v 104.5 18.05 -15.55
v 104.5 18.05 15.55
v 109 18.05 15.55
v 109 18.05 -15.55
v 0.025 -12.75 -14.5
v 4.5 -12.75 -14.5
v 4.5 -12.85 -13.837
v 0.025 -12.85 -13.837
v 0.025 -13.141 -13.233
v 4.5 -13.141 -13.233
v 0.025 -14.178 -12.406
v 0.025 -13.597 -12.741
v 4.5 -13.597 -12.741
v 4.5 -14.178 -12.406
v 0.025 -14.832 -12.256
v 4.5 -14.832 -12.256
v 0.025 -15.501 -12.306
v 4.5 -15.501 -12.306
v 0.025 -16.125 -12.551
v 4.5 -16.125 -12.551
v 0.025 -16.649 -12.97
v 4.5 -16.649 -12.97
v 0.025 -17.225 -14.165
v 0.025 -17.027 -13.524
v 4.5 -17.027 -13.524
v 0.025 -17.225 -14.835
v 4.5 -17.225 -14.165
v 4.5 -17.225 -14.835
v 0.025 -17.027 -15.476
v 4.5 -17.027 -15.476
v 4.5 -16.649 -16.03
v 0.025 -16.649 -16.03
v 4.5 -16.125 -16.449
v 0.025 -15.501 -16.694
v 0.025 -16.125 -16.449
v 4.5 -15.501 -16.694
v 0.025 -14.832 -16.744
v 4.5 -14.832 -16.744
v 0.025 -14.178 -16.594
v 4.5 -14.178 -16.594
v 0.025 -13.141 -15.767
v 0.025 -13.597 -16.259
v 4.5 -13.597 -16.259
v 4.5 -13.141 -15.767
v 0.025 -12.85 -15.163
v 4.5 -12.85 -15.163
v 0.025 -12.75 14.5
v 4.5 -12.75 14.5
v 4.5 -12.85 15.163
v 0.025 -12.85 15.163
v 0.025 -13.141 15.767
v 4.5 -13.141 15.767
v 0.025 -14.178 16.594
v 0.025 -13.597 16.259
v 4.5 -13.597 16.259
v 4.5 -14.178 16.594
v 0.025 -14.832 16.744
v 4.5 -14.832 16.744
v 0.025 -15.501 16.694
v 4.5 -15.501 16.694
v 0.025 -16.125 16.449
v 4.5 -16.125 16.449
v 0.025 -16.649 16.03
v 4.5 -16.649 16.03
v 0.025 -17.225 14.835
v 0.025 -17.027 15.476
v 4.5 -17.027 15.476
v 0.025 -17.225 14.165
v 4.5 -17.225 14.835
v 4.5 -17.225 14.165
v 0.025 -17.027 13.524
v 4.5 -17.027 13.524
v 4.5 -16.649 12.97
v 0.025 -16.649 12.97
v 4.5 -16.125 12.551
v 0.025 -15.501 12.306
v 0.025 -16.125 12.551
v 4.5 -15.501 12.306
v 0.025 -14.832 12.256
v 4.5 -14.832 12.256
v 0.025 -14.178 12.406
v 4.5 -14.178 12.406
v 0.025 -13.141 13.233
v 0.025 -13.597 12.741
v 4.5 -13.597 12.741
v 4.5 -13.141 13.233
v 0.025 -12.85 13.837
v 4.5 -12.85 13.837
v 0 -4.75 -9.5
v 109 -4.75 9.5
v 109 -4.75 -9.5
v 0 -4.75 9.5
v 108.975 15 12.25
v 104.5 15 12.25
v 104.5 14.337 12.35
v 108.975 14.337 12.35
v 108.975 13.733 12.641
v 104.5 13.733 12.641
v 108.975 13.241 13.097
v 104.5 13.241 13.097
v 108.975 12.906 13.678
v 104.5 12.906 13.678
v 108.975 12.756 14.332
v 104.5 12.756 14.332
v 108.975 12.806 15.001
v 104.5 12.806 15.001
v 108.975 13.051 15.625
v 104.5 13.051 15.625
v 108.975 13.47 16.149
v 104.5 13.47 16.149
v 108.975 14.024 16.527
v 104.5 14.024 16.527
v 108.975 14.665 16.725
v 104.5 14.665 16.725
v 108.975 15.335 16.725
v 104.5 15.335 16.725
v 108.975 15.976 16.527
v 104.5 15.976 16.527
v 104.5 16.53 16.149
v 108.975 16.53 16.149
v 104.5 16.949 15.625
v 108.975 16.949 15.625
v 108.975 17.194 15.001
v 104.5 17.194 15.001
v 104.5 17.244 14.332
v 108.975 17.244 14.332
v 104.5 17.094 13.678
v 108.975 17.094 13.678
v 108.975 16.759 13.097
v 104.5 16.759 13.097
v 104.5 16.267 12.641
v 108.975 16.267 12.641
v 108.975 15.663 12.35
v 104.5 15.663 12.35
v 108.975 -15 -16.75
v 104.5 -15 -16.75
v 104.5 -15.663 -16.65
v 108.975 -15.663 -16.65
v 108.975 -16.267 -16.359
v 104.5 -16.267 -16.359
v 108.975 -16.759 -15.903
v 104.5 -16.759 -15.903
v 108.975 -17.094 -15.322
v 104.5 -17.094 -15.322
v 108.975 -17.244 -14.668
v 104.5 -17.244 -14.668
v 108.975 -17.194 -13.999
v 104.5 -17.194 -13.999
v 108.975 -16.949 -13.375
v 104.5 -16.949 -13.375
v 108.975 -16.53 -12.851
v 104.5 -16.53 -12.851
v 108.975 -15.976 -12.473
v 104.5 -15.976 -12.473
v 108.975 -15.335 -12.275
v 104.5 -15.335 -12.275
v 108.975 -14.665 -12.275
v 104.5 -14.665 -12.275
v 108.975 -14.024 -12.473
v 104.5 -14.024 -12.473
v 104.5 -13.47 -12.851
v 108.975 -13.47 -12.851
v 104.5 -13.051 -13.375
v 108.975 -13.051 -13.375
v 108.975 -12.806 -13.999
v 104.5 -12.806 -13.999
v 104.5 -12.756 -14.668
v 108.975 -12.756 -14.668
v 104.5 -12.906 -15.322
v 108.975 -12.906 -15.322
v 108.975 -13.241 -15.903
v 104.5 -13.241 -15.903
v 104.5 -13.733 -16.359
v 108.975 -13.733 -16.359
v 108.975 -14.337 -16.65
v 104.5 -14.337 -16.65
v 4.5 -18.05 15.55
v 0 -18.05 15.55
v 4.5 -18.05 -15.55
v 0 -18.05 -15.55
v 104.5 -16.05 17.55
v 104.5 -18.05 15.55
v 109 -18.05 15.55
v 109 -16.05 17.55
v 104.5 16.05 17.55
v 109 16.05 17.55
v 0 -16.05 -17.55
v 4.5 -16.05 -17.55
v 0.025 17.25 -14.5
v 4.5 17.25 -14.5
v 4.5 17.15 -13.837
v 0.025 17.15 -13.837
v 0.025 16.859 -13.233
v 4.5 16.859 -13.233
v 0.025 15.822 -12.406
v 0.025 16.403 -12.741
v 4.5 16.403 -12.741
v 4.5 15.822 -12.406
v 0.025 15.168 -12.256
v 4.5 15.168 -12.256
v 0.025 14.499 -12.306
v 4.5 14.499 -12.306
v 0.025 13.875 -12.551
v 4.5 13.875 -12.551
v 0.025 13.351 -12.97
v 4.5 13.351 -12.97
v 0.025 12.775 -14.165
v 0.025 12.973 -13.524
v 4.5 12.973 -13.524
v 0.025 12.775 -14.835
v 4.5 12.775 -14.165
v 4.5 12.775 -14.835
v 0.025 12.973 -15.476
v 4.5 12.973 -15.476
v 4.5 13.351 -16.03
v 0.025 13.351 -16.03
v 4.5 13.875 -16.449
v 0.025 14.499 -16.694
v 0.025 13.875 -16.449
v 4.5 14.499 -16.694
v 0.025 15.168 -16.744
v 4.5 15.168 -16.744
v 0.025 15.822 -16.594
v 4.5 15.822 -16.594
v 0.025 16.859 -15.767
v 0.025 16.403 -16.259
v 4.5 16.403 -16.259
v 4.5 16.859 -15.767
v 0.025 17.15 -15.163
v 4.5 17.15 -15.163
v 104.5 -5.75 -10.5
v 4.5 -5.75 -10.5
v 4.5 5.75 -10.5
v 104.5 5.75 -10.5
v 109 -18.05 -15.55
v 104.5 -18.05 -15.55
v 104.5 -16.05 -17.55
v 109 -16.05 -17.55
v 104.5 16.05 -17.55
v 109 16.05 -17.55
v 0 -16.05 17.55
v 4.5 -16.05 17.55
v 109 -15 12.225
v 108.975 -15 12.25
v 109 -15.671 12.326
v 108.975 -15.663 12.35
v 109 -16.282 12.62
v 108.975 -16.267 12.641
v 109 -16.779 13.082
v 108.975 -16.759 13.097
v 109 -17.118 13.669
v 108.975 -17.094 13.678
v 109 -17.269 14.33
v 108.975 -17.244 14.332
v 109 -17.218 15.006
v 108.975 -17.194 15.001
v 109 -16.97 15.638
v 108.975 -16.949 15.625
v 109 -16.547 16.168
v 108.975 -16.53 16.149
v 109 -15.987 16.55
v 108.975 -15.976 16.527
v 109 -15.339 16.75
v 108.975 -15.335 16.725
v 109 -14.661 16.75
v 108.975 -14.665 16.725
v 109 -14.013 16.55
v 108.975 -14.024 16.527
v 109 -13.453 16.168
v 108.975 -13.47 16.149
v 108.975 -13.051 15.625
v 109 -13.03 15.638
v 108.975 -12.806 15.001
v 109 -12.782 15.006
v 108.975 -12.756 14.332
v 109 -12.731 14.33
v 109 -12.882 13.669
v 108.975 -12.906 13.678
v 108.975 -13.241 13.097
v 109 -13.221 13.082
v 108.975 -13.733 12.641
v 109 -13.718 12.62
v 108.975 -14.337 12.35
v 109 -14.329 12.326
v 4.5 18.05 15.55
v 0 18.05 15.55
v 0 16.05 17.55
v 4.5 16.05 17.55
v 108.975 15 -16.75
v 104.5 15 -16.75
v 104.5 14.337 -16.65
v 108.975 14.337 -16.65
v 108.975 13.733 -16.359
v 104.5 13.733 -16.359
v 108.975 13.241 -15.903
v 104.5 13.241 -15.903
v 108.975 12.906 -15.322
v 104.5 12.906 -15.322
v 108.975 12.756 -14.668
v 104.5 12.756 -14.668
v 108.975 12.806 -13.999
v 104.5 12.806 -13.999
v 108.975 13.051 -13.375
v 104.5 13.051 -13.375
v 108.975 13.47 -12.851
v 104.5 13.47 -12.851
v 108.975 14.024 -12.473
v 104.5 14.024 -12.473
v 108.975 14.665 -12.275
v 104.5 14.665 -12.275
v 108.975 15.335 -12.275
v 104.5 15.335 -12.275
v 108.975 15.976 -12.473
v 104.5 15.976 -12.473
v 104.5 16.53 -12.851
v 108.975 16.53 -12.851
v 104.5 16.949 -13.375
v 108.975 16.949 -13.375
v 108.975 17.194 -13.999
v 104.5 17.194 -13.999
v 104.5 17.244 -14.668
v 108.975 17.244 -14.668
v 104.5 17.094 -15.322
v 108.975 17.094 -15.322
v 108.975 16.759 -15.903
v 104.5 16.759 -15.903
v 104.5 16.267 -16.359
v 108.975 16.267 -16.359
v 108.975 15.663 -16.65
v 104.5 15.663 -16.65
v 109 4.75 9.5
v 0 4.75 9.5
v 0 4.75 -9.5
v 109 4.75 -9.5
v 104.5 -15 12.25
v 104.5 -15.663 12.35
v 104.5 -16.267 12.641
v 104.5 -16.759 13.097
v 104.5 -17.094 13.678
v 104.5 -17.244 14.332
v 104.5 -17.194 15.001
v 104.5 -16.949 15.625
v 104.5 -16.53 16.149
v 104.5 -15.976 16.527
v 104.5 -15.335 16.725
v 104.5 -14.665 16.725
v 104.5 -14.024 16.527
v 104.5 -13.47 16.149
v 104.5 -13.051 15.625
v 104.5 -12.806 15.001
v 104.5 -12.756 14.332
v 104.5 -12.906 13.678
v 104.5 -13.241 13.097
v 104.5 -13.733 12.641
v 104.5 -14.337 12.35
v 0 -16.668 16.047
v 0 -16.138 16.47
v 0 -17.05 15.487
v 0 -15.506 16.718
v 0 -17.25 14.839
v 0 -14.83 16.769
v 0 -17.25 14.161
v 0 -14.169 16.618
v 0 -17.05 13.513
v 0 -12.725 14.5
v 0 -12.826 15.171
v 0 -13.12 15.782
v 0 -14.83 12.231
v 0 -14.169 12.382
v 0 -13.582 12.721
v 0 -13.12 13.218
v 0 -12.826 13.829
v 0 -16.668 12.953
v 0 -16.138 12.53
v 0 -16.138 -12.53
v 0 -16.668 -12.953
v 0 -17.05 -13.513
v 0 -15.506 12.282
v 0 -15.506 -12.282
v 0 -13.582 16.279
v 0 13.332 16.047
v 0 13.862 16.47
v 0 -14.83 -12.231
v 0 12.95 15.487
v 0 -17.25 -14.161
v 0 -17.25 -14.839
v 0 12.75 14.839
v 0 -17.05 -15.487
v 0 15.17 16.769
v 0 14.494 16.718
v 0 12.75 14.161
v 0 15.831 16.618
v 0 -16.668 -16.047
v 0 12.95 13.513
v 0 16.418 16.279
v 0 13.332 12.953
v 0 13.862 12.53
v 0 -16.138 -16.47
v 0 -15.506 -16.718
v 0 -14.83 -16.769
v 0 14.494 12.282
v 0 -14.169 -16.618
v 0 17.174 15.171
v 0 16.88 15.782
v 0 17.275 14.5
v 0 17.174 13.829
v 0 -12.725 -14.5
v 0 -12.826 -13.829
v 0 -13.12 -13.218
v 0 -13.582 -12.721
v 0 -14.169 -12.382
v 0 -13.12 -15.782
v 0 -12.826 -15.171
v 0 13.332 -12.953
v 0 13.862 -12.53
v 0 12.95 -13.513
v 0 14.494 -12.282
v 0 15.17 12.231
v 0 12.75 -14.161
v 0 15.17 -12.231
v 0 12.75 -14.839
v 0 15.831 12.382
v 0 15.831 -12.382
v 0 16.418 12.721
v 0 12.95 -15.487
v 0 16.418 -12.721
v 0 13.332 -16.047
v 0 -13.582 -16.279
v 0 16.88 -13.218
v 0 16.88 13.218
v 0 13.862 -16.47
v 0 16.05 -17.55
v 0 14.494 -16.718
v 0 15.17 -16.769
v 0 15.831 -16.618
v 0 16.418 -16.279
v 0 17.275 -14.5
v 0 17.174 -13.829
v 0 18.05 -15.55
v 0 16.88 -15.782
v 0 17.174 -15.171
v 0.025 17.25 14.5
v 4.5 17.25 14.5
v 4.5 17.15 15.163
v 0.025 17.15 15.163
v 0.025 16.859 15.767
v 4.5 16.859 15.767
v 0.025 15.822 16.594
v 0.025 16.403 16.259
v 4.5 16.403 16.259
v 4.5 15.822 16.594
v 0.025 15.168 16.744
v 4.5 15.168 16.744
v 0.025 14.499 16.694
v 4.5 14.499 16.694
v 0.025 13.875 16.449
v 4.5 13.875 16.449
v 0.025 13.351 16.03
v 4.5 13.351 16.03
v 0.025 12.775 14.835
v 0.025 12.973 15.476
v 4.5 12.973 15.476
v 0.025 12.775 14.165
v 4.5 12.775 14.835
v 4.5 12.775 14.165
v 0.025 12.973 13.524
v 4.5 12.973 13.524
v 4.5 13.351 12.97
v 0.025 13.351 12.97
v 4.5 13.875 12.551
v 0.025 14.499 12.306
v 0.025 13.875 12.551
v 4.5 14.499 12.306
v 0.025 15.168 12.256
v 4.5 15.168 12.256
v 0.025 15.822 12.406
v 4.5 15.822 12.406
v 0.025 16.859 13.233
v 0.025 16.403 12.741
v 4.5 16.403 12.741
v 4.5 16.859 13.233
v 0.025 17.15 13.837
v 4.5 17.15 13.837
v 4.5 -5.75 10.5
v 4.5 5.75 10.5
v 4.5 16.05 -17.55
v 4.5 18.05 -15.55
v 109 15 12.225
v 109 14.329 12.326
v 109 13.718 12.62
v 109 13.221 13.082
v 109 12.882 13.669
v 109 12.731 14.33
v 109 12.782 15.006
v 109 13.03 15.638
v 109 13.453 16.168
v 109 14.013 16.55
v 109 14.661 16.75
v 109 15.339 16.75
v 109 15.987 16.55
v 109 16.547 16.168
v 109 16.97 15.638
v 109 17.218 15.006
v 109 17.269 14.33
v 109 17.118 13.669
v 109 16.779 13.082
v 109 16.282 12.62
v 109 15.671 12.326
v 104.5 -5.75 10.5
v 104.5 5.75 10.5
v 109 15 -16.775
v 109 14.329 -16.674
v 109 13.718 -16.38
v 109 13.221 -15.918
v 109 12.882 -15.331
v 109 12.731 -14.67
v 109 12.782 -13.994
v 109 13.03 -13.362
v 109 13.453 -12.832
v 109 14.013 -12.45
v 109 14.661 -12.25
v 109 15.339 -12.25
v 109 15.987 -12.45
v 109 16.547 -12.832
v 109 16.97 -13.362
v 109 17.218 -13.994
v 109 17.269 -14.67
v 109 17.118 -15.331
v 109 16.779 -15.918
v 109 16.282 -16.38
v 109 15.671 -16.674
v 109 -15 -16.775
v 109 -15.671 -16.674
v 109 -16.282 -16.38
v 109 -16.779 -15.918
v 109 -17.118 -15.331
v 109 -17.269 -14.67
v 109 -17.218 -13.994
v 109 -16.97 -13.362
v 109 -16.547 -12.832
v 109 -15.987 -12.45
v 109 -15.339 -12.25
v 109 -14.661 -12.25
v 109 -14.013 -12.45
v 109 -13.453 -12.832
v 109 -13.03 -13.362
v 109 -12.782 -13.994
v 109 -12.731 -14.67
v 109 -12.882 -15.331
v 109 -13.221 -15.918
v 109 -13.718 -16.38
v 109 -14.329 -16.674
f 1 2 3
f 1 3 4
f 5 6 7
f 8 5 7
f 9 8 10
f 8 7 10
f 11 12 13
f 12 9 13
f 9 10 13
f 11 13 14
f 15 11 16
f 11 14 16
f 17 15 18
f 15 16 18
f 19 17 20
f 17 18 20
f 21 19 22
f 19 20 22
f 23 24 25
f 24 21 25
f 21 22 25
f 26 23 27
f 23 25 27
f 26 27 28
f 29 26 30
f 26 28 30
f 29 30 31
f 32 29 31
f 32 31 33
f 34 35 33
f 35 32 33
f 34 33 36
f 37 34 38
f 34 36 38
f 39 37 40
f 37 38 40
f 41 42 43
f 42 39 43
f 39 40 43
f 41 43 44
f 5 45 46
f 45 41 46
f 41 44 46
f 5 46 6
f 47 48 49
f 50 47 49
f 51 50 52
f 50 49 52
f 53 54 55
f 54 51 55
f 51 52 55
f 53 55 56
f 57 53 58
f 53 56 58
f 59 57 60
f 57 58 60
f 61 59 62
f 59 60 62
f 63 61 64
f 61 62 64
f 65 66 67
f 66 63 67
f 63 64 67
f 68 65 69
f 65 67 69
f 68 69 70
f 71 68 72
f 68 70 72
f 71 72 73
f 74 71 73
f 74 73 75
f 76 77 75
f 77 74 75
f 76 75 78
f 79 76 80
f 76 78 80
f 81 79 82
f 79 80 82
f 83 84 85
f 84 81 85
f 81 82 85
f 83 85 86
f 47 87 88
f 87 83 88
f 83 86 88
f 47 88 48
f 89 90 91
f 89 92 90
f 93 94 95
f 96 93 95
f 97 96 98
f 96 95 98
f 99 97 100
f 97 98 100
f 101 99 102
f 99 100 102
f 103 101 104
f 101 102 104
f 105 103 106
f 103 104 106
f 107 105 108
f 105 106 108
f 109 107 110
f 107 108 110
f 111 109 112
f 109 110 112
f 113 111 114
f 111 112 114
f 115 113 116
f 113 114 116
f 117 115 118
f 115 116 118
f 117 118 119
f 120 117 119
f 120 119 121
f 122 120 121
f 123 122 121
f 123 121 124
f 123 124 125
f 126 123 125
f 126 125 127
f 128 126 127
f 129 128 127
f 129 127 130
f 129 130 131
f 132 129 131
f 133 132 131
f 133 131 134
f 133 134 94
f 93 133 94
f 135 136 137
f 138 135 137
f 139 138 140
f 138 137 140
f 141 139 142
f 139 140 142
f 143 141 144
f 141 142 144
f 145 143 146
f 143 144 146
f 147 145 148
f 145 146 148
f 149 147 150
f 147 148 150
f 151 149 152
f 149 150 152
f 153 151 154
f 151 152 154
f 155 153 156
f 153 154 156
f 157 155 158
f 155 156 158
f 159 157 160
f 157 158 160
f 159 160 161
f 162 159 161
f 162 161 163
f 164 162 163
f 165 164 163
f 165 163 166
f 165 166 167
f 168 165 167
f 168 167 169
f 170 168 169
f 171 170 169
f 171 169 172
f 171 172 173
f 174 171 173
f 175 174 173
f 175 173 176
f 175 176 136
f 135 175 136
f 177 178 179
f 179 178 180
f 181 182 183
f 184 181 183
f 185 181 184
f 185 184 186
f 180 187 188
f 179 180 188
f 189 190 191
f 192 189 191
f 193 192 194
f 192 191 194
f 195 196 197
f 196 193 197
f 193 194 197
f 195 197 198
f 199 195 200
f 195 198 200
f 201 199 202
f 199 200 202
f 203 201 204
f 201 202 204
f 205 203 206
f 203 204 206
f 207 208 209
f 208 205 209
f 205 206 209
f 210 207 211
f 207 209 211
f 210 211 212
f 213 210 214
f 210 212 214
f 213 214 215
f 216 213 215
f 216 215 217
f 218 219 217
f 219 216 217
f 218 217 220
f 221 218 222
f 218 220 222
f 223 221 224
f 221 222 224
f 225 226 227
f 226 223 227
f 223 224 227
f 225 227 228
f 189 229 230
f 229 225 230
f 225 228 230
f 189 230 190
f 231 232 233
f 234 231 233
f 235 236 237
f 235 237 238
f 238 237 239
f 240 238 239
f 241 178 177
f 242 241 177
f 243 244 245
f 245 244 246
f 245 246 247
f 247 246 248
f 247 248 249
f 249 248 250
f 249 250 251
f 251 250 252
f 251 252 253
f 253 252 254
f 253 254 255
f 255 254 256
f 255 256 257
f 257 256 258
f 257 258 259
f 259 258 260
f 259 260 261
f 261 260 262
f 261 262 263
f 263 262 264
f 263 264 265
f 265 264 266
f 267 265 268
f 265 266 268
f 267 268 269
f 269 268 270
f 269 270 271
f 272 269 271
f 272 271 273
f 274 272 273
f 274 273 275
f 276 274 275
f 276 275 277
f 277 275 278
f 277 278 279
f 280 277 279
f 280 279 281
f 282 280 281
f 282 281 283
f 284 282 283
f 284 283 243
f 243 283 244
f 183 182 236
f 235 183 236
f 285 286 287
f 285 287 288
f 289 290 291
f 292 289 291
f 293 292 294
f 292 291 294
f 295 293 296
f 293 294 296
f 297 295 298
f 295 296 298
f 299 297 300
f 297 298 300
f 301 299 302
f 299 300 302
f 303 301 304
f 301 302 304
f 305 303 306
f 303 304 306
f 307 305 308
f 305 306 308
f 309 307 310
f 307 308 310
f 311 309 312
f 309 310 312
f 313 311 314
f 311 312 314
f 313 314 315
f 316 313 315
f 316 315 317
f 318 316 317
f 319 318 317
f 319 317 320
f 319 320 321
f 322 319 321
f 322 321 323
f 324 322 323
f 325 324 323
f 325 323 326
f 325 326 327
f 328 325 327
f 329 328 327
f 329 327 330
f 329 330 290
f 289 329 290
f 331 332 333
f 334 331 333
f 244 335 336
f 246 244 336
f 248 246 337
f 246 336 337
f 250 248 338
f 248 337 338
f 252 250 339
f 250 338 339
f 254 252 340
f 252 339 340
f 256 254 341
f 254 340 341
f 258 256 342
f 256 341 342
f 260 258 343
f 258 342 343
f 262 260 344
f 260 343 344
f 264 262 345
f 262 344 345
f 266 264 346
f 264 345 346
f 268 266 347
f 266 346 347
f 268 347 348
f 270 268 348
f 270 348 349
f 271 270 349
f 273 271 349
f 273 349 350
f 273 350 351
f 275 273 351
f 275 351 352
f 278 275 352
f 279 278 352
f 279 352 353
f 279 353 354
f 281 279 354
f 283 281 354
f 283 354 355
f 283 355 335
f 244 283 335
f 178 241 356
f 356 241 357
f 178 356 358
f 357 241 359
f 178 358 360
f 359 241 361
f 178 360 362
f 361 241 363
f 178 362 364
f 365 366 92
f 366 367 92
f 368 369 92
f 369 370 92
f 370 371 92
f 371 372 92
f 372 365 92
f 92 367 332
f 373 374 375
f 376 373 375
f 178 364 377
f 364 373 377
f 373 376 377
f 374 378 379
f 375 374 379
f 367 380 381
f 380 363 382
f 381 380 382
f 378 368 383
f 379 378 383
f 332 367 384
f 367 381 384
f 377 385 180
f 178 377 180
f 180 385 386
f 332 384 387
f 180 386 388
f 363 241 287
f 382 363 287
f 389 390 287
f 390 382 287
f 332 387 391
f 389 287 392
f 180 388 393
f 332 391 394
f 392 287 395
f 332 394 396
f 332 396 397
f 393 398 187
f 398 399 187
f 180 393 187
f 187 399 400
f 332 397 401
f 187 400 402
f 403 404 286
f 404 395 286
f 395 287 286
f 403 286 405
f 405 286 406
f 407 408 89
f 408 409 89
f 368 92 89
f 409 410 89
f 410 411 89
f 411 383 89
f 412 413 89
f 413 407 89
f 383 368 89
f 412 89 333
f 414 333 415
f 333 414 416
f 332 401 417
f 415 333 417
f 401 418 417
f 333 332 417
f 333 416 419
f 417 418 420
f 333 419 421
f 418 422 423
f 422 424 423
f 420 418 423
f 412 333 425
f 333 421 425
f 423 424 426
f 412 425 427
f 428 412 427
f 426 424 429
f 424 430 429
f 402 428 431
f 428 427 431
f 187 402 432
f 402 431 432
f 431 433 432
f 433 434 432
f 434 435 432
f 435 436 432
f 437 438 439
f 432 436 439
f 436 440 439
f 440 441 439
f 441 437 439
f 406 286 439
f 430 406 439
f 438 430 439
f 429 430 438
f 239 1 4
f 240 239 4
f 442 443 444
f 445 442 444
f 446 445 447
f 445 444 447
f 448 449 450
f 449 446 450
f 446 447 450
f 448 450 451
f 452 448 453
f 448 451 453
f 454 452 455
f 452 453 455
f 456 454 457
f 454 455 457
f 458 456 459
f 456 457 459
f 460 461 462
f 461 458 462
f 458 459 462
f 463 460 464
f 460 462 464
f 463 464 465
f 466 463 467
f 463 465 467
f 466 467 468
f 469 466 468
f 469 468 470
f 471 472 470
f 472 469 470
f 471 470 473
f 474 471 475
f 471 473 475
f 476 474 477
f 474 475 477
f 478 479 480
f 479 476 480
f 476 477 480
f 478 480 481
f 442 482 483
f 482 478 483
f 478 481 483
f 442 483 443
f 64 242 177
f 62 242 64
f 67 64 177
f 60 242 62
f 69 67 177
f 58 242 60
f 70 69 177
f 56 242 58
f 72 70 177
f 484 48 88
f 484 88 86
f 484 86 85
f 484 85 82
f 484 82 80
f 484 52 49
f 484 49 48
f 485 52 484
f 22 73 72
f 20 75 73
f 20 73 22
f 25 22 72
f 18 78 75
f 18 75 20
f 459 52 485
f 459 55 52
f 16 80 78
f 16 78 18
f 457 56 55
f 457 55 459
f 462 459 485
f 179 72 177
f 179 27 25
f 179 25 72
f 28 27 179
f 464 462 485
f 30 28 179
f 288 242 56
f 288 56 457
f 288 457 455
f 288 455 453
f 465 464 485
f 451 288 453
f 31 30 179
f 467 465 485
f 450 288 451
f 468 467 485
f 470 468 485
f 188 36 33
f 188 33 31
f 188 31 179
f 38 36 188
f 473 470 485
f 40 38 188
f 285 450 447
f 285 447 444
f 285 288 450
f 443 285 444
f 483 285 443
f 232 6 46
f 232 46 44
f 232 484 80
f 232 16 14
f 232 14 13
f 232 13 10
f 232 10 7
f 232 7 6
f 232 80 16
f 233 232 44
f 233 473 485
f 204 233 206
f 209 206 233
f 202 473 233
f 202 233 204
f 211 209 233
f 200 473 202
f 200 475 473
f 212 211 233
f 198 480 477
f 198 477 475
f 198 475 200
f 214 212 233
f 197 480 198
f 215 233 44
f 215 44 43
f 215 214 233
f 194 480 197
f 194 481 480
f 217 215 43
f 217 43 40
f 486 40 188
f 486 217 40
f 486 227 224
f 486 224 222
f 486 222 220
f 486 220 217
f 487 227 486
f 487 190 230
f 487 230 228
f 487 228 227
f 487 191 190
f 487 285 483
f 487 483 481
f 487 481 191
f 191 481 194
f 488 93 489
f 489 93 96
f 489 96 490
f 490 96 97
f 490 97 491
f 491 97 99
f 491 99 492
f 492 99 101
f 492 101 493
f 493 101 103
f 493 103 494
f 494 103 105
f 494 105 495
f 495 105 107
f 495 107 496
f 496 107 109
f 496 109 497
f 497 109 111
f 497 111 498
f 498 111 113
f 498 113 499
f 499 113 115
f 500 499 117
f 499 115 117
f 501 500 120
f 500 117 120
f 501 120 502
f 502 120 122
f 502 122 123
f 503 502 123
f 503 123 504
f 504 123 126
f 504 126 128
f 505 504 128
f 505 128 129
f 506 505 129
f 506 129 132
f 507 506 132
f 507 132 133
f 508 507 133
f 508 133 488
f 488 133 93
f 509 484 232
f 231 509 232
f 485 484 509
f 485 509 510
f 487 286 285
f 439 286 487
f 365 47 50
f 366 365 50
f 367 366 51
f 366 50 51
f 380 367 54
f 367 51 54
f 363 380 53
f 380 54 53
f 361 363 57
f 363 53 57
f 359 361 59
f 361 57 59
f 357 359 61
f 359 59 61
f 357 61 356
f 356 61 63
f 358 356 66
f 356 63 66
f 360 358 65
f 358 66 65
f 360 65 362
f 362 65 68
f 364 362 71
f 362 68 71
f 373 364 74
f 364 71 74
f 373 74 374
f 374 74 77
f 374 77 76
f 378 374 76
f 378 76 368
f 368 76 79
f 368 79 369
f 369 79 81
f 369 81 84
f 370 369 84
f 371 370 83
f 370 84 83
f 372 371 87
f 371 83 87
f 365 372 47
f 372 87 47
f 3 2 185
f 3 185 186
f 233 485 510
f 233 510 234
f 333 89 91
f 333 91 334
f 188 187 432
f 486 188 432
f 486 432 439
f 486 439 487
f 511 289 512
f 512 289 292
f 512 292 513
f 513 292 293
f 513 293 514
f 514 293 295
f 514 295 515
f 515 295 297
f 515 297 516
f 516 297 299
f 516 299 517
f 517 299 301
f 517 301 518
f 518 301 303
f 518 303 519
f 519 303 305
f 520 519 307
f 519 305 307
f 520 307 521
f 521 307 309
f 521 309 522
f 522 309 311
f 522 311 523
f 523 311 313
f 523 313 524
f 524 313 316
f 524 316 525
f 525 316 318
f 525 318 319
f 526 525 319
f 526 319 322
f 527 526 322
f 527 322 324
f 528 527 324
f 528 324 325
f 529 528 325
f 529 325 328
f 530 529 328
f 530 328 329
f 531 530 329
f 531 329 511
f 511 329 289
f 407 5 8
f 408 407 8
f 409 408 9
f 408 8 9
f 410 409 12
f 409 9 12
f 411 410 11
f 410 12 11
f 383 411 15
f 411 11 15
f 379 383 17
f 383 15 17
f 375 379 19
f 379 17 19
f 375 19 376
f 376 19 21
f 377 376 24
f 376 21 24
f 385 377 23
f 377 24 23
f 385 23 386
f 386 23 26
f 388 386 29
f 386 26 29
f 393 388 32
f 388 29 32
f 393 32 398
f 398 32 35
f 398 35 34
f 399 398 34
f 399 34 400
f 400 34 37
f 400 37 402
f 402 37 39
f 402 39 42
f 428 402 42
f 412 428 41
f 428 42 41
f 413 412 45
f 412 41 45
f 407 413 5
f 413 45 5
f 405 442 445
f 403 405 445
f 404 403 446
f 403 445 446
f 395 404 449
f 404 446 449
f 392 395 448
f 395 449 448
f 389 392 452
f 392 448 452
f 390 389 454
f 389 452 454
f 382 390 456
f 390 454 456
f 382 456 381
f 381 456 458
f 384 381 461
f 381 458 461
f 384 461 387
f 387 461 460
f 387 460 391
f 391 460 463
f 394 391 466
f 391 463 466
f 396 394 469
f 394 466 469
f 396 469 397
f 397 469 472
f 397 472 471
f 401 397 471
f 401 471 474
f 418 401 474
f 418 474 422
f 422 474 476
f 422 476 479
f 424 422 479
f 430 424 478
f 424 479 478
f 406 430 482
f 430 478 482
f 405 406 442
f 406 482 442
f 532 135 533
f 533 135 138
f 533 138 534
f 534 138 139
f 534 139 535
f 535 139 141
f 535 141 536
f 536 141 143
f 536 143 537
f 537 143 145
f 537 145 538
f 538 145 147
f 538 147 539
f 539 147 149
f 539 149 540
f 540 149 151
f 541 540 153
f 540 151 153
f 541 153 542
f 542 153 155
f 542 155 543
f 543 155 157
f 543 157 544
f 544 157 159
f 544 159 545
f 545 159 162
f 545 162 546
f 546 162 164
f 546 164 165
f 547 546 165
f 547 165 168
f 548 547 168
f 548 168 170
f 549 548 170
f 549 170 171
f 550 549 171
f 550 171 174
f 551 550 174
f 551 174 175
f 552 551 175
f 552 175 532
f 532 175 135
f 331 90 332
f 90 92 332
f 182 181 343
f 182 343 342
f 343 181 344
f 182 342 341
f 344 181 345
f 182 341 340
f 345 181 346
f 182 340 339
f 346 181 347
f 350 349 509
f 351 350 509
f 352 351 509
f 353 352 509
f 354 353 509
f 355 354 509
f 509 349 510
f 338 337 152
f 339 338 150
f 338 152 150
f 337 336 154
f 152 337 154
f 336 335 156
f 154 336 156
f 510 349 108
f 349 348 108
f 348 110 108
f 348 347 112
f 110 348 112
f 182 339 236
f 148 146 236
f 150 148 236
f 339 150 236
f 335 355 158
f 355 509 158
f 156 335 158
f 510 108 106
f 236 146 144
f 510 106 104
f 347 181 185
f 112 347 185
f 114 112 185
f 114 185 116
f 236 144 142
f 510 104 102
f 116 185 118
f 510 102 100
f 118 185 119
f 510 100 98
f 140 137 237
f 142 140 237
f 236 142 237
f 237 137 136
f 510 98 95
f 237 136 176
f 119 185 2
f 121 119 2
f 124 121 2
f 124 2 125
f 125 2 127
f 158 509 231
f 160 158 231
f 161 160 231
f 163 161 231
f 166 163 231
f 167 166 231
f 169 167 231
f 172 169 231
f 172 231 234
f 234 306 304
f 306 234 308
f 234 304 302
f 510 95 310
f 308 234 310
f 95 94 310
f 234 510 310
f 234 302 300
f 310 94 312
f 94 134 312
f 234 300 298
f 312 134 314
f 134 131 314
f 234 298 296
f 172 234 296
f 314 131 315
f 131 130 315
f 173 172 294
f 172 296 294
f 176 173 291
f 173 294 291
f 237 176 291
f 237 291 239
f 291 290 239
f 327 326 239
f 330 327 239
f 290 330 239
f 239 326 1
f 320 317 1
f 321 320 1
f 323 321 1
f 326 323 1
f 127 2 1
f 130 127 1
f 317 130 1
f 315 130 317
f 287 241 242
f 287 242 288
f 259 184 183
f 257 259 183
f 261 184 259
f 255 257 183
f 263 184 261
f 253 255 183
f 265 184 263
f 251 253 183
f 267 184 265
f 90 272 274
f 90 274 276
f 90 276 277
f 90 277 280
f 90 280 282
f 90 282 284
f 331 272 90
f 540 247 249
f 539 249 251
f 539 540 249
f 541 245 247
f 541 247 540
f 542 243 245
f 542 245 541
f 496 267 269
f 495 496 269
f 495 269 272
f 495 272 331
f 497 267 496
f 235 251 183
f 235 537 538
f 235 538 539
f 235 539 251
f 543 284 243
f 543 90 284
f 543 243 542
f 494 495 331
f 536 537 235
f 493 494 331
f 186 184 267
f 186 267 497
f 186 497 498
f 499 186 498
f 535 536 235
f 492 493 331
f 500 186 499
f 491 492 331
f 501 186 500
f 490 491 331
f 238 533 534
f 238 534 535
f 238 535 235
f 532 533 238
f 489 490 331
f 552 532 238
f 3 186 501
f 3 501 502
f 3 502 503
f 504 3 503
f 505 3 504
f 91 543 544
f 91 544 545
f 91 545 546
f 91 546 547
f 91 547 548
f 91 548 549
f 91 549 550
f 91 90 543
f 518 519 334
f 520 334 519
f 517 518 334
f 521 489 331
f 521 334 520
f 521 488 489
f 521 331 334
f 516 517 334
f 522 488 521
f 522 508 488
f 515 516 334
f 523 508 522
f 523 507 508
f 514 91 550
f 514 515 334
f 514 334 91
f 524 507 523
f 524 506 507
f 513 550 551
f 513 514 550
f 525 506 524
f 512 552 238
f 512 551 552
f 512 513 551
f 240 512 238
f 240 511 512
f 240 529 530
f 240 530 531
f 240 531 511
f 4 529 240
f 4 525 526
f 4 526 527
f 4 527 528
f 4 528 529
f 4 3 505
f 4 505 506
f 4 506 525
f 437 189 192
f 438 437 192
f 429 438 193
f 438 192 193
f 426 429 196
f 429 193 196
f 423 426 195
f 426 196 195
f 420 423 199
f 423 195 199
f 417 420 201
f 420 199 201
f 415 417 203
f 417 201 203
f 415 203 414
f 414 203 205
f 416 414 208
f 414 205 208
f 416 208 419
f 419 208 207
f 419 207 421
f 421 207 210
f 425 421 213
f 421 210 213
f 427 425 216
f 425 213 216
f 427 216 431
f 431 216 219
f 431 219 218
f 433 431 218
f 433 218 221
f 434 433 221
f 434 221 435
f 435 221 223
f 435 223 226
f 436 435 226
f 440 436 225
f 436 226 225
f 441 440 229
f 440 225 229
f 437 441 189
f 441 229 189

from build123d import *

# Parameters (mm, degrees)
SKETCH_1_W                  = 35.1
SKETCH_1_H                  = 36.1
SKETCH_1_W_2                = 19
SKETCH_1_H_2                = 9.5
EXTRUDE_1_DEPTH             = 4.5
CHAMFER_1_SIZE              = 2
SKETCH_4_W                  = 21
SKETCH_4_H                  = 11.5
SKETCH_4_W_2                = 19
SKETCH_4_H_2                = 9.5
EXTRUDE_2_DEPTH             = 100
SKETCH_5_W                  = 35.1
SKETCH_5_H                  = 36.1
SKETCH_5_W_2                = 19
SKETCH_5_H_2                = 9.5
EXTRUDE_3_DEPTH             = 4.5
CHAMFER_2_SIZE              = 2
PATTERN_LINEAR_1_COUNT      = 2
PATTERN_LINEAR_1_PITCH      = 29
PATTERN_LINEAR_1_COUNT_DIR2 = 2
PATTERN_LINEAR_1_PITCH_DIR2 = 30
HOLE_WIZARD_M42_D           = 4.5
HOLE_WIZARD_M42_CSINK_D     = 4.55
HOLE_WIZARD_M42_CSINK_ANGLE = 90


# Read off the part's stored shape, not the designer's step: Отверстие с зазором M41
with BuildPart() as part:
    # Эскиз1 → Бобышка-Вытянуть1 (new body)
    with BuildSketch(Plane(origin=(0, 0, 0), x_dir=(0, 0, -1), z_dir=(1, 0, 0))):
        Rectangle(SKETCH_1_W, SKETCH_1_H)
        Rectangle(SKETCH_1_W_2, SKETCH_1_H_2, mode=Mode.SUBTRACT)
    extrude(amount=EXTRUDE_1_DEPTH)

    # Фаска1
    chamfer_1_edges = [part.edges().sort_by_distance(p)[0] for p in [
        (2.25, -18.05, -17.55),
        (2.25, -18.05, 17.55),
        (2.25, 18.05, 17.55),
        (2.25, 18.05, -17.55),
    ]]
    chamfer(chamfer_1_edges, length=CHAMFER_1_SIZE)

    # Эскиз4 → Бобышка-Вытянуть2 (add)
    with BuildSketch(Plane(origin=(4.5, 0, 0), x_dir=(0, 0, -1), z_dir=(1, 0, 0))):
        Rectangle(SKETCH_4_W, SKETCH_4_H)
        Rectangle(SKETCH_4_W_2, SKETCH_4_H_2, mode=Mode.SUBTRACT)
    extrude(amount=EXTRUDE_2_DEPTH)

    # Эскиз5 → Бобышка-Вытянуть3 (add)
    with BuildSketch(Plane(origin=(104.5, 0, 0), x_dir=(0, 0, -1), z_dir=(1, 0, 0))):
        Rectangle(SKETCH_5_W, SKETCH_5_H)
        Rectangle(SKETCH_5_W_2, SKETCH_5_H_2, mode=Mode.SUBTRACT)
    extrude(amount=EXTRUDE_3_DEPTH)

    # Фаска2
    chamfer_2_edges = [part.edges().sort_by_distance(p)[0] for p in [
        (106.75, -18.05, -17.55),
        (106.75, 18.05, -17.55),
        (106.75, 18.05, 17.55),
        (106.75, -18.05, 17.55),
    ]]
    chamfer(chamfer_2_edges, length=CHAMFER_2_SIZE)

    # Отверстие с зазором M41 outline → Отверстие с зазором M41 (revolve, cut)
    with BuildSketch(Plane(origin=(0, 15, 14.5), x_dir=(0, 1, 0), z_dir=(0, 0, -1))):
        Polygon((2.25, 0.025), (2.25, 4.5), (0, 4.5), (0, 0), (2.275, 0), align=None)
    hole_wizard_m41 = revolve(axis=Axis((0, 15, 14.5), (1, 0, 0)), mode=Mode.SUBTRACT)

    # Линейный массив1: Hole Wizard M41 2 × 2
    with Locations(*[(0, -j * PATTERN_LINEAR_1_PITCH_DIR2, -i * PATTERN_LINEAR_1_PITCH) for i in range(PATTERN_LINEAR_1_COUNT) for j in range(PATTERN_LINEAR_1_COUNT_DIR2) if (i, j) != (0, 0)]):
        add(hole_wizard_m41, mode=Mode.SUBTRACT)

    # Отверстие с зазором M42 (through all)
    with Locations(Plane(origin=(109, 15, 14.5), x_dir=(0, 0, 1), z_dir=(1, 0, 0))):
        with Locations((0, 0), (-29, 0), (-29, 30), (0, 30)):
            CounterSinkHole(HOLE_WIZARD_M42_D / 2, HOLE_WIZARD_M42_CSINK_D / 2, counter_sink_angle=HOLE_WIZARD_M42_CSINK_ANGLE)


solid = part.part
